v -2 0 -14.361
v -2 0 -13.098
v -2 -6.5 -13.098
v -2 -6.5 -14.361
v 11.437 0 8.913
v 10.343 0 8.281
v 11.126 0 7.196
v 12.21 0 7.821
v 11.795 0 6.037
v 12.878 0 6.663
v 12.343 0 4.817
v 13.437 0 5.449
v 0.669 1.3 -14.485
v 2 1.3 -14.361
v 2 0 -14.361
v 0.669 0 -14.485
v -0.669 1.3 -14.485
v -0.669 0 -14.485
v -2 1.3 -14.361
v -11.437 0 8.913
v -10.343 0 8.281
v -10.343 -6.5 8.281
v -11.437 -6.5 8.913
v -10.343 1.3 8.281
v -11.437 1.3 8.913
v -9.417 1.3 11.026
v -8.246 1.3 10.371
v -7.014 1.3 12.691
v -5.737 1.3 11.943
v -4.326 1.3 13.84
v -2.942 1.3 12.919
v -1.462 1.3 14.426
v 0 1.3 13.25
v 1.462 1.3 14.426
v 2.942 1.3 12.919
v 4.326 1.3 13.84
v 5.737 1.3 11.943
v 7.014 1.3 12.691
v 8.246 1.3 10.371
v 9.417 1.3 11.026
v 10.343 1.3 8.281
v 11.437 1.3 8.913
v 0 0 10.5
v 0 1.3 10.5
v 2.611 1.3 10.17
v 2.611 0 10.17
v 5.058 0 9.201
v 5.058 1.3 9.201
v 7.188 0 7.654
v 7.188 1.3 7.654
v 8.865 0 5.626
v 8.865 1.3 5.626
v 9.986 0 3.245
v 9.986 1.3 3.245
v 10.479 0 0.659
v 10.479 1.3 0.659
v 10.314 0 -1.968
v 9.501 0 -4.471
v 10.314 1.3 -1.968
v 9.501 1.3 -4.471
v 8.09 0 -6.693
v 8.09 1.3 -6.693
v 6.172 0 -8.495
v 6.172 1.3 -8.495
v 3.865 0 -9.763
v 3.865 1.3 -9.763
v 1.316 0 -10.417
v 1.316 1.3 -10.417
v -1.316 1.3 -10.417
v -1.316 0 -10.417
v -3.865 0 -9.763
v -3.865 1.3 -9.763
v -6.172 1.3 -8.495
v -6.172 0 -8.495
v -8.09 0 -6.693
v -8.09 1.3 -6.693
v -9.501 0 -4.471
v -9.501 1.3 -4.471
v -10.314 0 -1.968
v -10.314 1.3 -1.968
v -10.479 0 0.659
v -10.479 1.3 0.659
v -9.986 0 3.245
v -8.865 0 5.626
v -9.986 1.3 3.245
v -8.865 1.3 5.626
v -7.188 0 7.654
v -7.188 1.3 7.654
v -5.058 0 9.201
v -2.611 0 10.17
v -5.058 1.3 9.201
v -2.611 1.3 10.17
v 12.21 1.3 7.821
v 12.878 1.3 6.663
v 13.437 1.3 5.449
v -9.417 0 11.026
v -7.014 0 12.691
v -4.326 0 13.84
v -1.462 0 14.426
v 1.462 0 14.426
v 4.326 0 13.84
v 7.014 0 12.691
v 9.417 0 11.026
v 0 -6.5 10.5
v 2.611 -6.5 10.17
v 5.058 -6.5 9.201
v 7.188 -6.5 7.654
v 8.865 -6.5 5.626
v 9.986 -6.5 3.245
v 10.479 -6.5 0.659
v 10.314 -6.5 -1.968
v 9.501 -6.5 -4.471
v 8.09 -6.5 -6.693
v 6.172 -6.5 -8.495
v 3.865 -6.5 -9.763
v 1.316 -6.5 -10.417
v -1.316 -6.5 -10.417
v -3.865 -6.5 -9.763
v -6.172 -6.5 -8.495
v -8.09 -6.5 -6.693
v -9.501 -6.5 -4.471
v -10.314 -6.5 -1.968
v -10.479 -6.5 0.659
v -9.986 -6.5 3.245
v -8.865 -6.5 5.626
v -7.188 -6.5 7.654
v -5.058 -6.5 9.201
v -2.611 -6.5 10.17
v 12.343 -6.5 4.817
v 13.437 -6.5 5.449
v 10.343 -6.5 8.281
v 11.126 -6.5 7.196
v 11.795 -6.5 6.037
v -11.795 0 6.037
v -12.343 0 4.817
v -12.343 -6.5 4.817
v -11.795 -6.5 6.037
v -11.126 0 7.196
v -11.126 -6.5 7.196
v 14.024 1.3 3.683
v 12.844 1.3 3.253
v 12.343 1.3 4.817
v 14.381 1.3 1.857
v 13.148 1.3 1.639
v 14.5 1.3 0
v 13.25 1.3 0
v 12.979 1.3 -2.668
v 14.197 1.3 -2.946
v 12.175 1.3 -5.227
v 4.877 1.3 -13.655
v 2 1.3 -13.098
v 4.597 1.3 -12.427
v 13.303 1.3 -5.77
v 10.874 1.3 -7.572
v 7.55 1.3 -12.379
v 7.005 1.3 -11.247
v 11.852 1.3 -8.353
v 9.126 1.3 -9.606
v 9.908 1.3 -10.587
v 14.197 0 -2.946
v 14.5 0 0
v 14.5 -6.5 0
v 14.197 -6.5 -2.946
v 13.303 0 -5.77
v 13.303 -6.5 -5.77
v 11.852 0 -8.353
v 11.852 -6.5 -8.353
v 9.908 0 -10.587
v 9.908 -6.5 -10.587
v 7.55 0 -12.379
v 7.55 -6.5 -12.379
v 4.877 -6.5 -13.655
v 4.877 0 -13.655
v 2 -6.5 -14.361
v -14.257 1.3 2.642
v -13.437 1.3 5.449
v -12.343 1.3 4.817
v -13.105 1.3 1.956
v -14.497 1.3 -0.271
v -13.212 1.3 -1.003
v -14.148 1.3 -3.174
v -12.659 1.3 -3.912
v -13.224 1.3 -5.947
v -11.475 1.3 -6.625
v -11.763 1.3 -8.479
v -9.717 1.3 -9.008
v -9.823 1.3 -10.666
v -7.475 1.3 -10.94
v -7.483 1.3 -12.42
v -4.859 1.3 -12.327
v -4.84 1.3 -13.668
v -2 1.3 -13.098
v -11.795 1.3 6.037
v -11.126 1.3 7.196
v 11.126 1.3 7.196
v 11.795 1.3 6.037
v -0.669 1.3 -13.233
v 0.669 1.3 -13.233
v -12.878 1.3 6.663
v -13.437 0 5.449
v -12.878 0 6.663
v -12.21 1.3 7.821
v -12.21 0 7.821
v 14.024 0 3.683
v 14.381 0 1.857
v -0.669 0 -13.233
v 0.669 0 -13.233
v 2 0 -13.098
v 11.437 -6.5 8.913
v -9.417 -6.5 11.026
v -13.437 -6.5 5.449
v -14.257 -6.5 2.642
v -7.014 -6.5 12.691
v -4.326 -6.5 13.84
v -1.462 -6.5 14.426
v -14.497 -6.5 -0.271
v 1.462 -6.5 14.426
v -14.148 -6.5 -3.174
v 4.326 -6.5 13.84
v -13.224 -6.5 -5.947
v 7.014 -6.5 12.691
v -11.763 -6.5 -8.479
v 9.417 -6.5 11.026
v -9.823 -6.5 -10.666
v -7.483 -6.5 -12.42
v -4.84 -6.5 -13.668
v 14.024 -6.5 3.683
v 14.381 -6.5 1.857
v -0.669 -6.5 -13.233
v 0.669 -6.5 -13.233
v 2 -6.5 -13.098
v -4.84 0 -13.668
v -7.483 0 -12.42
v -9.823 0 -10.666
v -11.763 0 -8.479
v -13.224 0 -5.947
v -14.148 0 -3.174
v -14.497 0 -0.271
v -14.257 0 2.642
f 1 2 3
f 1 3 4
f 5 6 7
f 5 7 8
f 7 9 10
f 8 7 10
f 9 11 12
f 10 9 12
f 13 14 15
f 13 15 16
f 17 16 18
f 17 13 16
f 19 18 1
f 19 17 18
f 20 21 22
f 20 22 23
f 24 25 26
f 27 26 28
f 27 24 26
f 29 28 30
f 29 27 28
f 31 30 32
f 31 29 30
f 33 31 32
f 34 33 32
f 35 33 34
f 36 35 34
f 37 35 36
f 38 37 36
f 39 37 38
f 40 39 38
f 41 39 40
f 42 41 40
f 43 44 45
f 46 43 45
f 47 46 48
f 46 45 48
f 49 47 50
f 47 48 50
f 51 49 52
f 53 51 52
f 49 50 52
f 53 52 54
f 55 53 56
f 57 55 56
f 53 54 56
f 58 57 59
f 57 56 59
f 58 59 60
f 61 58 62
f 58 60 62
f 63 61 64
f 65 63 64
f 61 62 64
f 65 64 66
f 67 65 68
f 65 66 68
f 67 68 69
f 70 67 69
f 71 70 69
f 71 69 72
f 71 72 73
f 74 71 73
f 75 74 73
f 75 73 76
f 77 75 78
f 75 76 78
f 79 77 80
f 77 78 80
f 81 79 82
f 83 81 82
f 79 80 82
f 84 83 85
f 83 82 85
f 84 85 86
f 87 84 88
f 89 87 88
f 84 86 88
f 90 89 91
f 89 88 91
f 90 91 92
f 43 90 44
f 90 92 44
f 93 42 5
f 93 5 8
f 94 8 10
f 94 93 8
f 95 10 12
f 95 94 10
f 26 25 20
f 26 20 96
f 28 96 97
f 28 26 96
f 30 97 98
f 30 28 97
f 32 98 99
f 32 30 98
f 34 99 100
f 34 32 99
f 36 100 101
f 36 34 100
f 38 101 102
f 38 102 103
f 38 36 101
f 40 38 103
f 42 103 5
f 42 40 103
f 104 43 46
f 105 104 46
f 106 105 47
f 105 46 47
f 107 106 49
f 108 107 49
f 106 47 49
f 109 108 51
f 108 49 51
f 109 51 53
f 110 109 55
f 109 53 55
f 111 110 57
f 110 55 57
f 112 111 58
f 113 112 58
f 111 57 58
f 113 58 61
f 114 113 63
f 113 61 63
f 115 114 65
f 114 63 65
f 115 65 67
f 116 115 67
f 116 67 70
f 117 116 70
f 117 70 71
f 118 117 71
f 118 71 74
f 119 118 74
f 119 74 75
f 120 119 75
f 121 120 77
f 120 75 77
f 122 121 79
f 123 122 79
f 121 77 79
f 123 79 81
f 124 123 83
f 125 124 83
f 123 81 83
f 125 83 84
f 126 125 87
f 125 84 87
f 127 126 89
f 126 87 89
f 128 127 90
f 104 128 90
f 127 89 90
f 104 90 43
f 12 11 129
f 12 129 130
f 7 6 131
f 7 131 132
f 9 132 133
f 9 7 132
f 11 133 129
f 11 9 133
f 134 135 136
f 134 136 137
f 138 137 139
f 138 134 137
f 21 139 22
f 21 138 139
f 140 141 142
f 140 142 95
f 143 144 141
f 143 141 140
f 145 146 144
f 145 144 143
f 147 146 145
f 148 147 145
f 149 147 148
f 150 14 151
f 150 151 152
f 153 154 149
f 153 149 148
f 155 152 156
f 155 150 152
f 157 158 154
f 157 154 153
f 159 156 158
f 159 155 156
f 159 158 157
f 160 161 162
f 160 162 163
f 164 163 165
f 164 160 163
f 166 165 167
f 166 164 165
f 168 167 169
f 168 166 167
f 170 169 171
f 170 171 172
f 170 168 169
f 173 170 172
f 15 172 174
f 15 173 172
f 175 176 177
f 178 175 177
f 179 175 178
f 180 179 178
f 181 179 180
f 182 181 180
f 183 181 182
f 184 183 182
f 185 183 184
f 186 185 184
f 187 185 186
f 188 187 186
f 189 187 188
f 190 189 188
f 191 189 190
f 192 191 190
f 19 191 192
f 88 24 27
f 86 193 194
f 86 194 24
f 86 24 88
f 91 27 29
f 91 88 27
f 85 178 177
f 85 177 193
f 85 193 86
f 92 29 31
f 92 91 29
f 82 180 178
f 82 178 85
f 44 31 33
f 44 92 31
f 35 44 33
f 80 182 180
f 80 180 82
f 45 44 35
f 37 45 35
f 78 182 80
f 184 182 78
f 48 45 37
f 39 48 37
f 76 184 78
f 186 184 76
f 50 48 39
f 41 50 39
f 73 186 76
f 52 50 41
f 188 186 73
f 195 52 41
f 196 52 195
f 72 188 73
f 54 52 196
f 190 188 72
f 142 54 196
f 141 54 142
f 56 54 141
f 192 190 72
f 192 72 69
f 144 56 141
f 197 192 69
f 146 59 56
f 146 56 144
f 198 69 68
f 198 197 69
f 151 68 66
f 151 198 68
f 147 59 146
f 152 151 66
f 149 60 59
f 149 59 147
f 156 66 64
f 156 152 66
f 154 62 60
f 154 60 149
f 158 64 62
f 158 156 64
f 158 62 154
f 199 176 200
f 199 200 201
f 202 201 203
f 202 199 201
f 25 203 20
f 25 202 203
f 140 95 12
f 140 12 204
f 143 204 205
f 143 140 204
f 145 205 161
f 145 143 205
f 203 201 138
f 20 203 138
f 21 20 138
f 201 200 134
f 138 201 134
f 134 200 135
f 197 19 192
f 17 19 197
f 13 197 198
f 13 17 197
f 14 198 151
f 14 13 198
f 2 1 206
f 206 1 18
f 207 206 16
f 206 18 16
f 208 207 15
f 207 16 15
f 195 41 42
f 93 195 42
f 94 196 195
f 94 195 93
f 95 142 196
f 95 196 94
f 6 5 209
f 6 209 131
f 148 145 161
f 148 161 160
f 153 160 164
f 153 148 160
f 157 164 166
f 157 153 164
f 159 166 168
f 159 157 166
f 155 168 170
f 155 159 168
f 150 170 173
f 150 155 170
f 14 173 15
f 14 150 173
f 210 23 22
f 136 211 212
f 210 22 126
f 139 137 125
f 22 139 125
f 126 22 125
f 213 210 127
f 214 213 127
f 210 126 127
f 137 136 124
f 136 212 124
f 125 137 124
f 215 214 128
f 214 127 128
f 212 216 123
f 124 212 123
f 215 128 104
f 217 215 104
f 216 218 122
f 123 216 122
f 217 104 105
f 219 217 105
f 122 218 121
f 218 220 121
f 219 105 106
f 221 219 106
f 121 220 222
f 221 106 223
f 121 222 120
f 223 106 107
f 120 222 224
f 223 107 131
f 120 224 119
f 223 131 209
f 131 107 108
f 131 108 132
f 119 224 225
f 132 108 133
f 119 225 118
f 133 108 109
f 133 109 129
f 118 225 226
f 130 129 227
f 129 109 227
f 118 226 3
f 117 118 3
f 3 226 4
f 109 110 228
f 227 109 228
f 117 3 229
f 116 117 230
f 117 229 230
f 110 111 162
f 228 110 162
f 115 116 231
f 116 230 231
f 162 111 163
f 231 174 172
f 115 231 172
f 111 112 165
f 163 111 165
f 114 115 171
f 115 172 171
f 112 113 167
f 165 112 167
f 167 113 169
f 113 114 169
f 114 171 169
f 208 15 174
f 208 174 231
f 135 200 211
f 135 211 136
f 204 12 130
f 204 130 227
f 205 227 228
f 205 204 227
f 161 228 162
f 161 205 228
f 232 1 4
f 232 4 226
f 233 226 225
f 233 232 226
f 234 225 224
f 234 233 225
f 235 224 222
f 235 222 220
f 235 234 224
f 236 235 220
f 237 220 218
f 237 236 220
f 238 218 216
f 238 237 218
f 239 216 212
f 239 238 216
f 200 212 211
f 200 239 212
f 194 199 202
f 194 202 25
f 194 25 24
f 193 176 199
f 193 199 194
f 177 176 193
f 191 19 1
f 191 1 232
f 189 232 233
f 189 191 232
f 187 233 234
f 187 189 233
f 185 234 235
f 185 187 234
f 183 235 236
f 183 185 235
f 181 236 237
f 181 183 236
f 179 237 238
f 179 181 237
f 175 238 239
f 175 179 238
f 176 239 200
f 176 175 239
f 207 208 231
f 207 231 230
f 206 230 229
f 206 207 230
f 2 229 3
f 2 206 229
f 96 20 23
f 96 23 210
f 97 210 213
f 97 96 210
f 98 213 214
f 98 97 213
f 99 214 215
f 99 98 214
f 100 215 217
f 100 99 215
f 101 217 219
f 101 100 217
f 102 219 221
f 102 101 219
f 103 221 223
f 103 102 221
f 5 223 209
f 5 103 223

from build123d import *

# Parameters (mm, degrees)
SKETCH1_R           = 10.5
BOSS_EXTRUDE1_DEPTH = 6.5
BOSS_EXTRUDE2_START = 1.3
SKETCH1_3_R         = 14.5
SKETCH1_3_R_2       = 10.5
BOSS_EXTRUDE2_DEPTH = 1.3


with BuildPart() as part:
    # Sketch1 → Boss-Extrude1 (new body)
    with BuildSketch(Plane(origin=(0, 0, 0), x_dir=(1, 0, 0), z_dir=(0, 1, 0))):
        with BuildLine():
            Line((-13.437342964, -5.448652501), (-12.343362597, -4.817042641))
            ThreePointArc((-12.343362597, -4.817042641), (-11.4748366, -6.625), (-10.343362597, -8.281144256))
            Line((-10.343362597, -8.281144256), (-11.437342964, -8.912754116))
            ThreePointArc((-11.437342964, -8.912754116), (0, -14.5), (11.437342964, -8.912754116))
            Line((11.437342964, -8.912754116), (10.343362597, -8.281144256))
            ThreePointArc((10.343362597, -8.281144256), (11.4748366, -6.625), (12.343362597, -4.817042641))
            Line((12.343362597, -4.817042641), (13.437342964, -5.448652501))
            ThreePointArc((13.437342964, -5.448652501), (12.557368355, 7.25), (2, 14.361406616))
            Line((2, 14.361406616), (2, 13.098186897))
            ThreePointArc((2, 13.098186897), (0, 13.25), (-2, 13.098186897))
            Line((-2, 13.098186897), (-2, 14.361406616))
            ThreePointArc((-2, 14.361406616), (-12.557368355, 7.25), (-13.437342964, -5.448652501))
        make_face()
        Circle(SKETCH1_R, mode=Mode.SUBTRACT)
    extrude(amount=-BOSS_EXTRUDE1_DEPTH)

    # Sketch1<3> → Boss-Extrude2 (add)
    with BuildSketch(Plane(origin=(0, 0, 0), x_dir=(1, 0, 0), z_dir=(0, 1, 0)).offset(BOSS_EXTRUDE2_START)):
        Circle(SKETCH1_3_R)
        Circle(SKETCH1_3_R_2, mode=Mode.SUBTRACT)
    extrude(amount=-BOSS_EXTRUDE2_DEPTH)


solid = part.part
